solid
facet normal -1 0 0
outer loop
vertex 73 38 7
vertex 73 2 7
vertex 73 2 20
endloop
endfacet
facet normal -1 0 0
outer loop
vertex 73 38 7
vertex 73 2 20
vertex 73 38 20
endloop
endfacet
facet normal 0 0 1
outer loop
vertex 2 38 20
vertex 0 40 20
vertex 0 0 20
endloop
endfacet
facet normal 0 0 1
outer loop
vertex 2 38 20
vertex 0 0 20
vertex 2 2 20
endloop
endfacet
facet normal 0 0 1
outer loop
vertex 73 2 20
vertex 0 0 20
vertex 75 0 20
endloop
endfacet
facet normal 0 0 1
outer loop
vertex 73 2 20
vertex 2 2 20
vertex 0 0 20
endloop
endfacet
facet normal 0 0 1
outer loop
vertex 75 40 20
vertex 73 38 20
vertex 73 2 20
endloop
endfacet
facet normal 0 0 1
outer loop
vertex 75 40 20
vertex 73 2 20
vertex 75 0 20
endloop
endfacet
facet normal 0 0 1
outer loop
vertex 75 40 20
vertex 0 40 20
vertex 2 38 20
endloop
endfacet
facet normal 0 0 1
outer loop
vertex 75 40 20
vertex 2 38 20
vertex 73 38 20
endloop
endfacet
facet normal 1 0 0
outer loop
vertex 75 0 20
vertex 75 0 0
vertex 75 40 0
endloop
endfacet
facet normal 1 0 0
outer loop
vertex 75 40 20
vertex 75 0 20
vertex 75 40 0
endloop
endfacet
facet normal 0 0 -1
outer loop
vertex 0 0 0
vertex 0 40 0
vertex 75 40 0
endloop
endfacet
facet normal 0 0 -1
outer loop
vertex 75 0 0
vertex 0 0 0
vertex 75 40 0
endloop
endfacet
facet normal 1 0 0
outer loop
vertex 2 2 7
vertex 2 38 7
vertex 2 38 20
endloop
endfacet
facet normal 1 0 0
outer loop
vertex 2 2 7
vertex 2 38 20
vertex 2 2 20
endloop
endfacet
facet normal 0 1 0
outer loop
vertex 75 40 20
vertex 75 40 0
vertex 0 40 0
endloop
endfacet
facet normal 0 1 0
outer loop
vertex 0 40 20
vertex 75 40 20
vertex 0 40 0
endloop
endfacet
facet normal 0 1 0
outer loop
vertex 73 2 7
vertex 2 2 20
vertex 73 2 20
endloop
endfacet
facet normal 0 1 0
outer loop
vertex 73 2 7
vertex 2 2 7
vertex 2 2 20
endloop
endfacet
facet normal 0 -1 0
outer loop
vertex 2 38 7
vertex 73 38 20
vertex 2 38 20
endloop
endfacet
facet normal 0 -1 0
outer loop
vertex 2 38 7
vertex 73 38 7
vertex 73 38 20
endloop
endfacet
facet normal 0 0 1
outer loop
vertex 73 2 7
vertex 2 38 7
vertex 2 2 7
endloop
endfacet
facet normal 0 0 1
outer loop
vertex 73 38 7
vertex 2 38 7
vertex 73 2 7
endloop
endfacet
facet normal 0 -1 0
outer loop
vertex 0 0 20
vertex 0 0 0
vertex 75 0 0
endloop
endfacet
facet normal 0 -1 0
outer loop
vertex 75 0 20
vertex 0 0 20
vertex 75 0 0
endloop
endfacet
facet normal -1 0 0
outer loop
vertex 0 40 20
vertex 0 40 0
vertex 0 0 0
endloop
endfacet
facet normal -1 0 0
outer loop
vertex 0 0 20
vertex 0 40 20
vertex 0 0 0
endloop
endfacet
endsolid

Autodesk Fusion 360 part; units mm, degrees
sketch "Szkic1" plane through (0, 0, 0) normal (0, 0, 1) x (1, 0, 0)
  line L0 (0, 0) -> (75, 0)
  line L1 (75, 0) -> (75, 40)
  line L2 (75, 40) -> (0, 40)
  line L3 (0, 40) -> (0, 0)
  dimension "d1" = 75
  dimension "d2" = 40
extrude "Wyciągnięcie proste1" add sketch "Szkic1" along normal blind 20 makes body 1
shell "Skorupa1" thickness 2 removed faces 1 at (25, 26.6667, 20) on bodies 1
extrude "Wyciągnięcie proste2" add 1 faces at (25.6667, 14, 2) along direction (0, 0, 1) blind 5 on bodies 1 bodies 1
copy_body "Bryła->Komponent1" bodies 1 removing the originals makes body 2 in component "koszyk"
component "koszyk" placed x (1, 0, 0) y (0, 1, 0) z (0, 0, 1) at (0, 0, 0)
